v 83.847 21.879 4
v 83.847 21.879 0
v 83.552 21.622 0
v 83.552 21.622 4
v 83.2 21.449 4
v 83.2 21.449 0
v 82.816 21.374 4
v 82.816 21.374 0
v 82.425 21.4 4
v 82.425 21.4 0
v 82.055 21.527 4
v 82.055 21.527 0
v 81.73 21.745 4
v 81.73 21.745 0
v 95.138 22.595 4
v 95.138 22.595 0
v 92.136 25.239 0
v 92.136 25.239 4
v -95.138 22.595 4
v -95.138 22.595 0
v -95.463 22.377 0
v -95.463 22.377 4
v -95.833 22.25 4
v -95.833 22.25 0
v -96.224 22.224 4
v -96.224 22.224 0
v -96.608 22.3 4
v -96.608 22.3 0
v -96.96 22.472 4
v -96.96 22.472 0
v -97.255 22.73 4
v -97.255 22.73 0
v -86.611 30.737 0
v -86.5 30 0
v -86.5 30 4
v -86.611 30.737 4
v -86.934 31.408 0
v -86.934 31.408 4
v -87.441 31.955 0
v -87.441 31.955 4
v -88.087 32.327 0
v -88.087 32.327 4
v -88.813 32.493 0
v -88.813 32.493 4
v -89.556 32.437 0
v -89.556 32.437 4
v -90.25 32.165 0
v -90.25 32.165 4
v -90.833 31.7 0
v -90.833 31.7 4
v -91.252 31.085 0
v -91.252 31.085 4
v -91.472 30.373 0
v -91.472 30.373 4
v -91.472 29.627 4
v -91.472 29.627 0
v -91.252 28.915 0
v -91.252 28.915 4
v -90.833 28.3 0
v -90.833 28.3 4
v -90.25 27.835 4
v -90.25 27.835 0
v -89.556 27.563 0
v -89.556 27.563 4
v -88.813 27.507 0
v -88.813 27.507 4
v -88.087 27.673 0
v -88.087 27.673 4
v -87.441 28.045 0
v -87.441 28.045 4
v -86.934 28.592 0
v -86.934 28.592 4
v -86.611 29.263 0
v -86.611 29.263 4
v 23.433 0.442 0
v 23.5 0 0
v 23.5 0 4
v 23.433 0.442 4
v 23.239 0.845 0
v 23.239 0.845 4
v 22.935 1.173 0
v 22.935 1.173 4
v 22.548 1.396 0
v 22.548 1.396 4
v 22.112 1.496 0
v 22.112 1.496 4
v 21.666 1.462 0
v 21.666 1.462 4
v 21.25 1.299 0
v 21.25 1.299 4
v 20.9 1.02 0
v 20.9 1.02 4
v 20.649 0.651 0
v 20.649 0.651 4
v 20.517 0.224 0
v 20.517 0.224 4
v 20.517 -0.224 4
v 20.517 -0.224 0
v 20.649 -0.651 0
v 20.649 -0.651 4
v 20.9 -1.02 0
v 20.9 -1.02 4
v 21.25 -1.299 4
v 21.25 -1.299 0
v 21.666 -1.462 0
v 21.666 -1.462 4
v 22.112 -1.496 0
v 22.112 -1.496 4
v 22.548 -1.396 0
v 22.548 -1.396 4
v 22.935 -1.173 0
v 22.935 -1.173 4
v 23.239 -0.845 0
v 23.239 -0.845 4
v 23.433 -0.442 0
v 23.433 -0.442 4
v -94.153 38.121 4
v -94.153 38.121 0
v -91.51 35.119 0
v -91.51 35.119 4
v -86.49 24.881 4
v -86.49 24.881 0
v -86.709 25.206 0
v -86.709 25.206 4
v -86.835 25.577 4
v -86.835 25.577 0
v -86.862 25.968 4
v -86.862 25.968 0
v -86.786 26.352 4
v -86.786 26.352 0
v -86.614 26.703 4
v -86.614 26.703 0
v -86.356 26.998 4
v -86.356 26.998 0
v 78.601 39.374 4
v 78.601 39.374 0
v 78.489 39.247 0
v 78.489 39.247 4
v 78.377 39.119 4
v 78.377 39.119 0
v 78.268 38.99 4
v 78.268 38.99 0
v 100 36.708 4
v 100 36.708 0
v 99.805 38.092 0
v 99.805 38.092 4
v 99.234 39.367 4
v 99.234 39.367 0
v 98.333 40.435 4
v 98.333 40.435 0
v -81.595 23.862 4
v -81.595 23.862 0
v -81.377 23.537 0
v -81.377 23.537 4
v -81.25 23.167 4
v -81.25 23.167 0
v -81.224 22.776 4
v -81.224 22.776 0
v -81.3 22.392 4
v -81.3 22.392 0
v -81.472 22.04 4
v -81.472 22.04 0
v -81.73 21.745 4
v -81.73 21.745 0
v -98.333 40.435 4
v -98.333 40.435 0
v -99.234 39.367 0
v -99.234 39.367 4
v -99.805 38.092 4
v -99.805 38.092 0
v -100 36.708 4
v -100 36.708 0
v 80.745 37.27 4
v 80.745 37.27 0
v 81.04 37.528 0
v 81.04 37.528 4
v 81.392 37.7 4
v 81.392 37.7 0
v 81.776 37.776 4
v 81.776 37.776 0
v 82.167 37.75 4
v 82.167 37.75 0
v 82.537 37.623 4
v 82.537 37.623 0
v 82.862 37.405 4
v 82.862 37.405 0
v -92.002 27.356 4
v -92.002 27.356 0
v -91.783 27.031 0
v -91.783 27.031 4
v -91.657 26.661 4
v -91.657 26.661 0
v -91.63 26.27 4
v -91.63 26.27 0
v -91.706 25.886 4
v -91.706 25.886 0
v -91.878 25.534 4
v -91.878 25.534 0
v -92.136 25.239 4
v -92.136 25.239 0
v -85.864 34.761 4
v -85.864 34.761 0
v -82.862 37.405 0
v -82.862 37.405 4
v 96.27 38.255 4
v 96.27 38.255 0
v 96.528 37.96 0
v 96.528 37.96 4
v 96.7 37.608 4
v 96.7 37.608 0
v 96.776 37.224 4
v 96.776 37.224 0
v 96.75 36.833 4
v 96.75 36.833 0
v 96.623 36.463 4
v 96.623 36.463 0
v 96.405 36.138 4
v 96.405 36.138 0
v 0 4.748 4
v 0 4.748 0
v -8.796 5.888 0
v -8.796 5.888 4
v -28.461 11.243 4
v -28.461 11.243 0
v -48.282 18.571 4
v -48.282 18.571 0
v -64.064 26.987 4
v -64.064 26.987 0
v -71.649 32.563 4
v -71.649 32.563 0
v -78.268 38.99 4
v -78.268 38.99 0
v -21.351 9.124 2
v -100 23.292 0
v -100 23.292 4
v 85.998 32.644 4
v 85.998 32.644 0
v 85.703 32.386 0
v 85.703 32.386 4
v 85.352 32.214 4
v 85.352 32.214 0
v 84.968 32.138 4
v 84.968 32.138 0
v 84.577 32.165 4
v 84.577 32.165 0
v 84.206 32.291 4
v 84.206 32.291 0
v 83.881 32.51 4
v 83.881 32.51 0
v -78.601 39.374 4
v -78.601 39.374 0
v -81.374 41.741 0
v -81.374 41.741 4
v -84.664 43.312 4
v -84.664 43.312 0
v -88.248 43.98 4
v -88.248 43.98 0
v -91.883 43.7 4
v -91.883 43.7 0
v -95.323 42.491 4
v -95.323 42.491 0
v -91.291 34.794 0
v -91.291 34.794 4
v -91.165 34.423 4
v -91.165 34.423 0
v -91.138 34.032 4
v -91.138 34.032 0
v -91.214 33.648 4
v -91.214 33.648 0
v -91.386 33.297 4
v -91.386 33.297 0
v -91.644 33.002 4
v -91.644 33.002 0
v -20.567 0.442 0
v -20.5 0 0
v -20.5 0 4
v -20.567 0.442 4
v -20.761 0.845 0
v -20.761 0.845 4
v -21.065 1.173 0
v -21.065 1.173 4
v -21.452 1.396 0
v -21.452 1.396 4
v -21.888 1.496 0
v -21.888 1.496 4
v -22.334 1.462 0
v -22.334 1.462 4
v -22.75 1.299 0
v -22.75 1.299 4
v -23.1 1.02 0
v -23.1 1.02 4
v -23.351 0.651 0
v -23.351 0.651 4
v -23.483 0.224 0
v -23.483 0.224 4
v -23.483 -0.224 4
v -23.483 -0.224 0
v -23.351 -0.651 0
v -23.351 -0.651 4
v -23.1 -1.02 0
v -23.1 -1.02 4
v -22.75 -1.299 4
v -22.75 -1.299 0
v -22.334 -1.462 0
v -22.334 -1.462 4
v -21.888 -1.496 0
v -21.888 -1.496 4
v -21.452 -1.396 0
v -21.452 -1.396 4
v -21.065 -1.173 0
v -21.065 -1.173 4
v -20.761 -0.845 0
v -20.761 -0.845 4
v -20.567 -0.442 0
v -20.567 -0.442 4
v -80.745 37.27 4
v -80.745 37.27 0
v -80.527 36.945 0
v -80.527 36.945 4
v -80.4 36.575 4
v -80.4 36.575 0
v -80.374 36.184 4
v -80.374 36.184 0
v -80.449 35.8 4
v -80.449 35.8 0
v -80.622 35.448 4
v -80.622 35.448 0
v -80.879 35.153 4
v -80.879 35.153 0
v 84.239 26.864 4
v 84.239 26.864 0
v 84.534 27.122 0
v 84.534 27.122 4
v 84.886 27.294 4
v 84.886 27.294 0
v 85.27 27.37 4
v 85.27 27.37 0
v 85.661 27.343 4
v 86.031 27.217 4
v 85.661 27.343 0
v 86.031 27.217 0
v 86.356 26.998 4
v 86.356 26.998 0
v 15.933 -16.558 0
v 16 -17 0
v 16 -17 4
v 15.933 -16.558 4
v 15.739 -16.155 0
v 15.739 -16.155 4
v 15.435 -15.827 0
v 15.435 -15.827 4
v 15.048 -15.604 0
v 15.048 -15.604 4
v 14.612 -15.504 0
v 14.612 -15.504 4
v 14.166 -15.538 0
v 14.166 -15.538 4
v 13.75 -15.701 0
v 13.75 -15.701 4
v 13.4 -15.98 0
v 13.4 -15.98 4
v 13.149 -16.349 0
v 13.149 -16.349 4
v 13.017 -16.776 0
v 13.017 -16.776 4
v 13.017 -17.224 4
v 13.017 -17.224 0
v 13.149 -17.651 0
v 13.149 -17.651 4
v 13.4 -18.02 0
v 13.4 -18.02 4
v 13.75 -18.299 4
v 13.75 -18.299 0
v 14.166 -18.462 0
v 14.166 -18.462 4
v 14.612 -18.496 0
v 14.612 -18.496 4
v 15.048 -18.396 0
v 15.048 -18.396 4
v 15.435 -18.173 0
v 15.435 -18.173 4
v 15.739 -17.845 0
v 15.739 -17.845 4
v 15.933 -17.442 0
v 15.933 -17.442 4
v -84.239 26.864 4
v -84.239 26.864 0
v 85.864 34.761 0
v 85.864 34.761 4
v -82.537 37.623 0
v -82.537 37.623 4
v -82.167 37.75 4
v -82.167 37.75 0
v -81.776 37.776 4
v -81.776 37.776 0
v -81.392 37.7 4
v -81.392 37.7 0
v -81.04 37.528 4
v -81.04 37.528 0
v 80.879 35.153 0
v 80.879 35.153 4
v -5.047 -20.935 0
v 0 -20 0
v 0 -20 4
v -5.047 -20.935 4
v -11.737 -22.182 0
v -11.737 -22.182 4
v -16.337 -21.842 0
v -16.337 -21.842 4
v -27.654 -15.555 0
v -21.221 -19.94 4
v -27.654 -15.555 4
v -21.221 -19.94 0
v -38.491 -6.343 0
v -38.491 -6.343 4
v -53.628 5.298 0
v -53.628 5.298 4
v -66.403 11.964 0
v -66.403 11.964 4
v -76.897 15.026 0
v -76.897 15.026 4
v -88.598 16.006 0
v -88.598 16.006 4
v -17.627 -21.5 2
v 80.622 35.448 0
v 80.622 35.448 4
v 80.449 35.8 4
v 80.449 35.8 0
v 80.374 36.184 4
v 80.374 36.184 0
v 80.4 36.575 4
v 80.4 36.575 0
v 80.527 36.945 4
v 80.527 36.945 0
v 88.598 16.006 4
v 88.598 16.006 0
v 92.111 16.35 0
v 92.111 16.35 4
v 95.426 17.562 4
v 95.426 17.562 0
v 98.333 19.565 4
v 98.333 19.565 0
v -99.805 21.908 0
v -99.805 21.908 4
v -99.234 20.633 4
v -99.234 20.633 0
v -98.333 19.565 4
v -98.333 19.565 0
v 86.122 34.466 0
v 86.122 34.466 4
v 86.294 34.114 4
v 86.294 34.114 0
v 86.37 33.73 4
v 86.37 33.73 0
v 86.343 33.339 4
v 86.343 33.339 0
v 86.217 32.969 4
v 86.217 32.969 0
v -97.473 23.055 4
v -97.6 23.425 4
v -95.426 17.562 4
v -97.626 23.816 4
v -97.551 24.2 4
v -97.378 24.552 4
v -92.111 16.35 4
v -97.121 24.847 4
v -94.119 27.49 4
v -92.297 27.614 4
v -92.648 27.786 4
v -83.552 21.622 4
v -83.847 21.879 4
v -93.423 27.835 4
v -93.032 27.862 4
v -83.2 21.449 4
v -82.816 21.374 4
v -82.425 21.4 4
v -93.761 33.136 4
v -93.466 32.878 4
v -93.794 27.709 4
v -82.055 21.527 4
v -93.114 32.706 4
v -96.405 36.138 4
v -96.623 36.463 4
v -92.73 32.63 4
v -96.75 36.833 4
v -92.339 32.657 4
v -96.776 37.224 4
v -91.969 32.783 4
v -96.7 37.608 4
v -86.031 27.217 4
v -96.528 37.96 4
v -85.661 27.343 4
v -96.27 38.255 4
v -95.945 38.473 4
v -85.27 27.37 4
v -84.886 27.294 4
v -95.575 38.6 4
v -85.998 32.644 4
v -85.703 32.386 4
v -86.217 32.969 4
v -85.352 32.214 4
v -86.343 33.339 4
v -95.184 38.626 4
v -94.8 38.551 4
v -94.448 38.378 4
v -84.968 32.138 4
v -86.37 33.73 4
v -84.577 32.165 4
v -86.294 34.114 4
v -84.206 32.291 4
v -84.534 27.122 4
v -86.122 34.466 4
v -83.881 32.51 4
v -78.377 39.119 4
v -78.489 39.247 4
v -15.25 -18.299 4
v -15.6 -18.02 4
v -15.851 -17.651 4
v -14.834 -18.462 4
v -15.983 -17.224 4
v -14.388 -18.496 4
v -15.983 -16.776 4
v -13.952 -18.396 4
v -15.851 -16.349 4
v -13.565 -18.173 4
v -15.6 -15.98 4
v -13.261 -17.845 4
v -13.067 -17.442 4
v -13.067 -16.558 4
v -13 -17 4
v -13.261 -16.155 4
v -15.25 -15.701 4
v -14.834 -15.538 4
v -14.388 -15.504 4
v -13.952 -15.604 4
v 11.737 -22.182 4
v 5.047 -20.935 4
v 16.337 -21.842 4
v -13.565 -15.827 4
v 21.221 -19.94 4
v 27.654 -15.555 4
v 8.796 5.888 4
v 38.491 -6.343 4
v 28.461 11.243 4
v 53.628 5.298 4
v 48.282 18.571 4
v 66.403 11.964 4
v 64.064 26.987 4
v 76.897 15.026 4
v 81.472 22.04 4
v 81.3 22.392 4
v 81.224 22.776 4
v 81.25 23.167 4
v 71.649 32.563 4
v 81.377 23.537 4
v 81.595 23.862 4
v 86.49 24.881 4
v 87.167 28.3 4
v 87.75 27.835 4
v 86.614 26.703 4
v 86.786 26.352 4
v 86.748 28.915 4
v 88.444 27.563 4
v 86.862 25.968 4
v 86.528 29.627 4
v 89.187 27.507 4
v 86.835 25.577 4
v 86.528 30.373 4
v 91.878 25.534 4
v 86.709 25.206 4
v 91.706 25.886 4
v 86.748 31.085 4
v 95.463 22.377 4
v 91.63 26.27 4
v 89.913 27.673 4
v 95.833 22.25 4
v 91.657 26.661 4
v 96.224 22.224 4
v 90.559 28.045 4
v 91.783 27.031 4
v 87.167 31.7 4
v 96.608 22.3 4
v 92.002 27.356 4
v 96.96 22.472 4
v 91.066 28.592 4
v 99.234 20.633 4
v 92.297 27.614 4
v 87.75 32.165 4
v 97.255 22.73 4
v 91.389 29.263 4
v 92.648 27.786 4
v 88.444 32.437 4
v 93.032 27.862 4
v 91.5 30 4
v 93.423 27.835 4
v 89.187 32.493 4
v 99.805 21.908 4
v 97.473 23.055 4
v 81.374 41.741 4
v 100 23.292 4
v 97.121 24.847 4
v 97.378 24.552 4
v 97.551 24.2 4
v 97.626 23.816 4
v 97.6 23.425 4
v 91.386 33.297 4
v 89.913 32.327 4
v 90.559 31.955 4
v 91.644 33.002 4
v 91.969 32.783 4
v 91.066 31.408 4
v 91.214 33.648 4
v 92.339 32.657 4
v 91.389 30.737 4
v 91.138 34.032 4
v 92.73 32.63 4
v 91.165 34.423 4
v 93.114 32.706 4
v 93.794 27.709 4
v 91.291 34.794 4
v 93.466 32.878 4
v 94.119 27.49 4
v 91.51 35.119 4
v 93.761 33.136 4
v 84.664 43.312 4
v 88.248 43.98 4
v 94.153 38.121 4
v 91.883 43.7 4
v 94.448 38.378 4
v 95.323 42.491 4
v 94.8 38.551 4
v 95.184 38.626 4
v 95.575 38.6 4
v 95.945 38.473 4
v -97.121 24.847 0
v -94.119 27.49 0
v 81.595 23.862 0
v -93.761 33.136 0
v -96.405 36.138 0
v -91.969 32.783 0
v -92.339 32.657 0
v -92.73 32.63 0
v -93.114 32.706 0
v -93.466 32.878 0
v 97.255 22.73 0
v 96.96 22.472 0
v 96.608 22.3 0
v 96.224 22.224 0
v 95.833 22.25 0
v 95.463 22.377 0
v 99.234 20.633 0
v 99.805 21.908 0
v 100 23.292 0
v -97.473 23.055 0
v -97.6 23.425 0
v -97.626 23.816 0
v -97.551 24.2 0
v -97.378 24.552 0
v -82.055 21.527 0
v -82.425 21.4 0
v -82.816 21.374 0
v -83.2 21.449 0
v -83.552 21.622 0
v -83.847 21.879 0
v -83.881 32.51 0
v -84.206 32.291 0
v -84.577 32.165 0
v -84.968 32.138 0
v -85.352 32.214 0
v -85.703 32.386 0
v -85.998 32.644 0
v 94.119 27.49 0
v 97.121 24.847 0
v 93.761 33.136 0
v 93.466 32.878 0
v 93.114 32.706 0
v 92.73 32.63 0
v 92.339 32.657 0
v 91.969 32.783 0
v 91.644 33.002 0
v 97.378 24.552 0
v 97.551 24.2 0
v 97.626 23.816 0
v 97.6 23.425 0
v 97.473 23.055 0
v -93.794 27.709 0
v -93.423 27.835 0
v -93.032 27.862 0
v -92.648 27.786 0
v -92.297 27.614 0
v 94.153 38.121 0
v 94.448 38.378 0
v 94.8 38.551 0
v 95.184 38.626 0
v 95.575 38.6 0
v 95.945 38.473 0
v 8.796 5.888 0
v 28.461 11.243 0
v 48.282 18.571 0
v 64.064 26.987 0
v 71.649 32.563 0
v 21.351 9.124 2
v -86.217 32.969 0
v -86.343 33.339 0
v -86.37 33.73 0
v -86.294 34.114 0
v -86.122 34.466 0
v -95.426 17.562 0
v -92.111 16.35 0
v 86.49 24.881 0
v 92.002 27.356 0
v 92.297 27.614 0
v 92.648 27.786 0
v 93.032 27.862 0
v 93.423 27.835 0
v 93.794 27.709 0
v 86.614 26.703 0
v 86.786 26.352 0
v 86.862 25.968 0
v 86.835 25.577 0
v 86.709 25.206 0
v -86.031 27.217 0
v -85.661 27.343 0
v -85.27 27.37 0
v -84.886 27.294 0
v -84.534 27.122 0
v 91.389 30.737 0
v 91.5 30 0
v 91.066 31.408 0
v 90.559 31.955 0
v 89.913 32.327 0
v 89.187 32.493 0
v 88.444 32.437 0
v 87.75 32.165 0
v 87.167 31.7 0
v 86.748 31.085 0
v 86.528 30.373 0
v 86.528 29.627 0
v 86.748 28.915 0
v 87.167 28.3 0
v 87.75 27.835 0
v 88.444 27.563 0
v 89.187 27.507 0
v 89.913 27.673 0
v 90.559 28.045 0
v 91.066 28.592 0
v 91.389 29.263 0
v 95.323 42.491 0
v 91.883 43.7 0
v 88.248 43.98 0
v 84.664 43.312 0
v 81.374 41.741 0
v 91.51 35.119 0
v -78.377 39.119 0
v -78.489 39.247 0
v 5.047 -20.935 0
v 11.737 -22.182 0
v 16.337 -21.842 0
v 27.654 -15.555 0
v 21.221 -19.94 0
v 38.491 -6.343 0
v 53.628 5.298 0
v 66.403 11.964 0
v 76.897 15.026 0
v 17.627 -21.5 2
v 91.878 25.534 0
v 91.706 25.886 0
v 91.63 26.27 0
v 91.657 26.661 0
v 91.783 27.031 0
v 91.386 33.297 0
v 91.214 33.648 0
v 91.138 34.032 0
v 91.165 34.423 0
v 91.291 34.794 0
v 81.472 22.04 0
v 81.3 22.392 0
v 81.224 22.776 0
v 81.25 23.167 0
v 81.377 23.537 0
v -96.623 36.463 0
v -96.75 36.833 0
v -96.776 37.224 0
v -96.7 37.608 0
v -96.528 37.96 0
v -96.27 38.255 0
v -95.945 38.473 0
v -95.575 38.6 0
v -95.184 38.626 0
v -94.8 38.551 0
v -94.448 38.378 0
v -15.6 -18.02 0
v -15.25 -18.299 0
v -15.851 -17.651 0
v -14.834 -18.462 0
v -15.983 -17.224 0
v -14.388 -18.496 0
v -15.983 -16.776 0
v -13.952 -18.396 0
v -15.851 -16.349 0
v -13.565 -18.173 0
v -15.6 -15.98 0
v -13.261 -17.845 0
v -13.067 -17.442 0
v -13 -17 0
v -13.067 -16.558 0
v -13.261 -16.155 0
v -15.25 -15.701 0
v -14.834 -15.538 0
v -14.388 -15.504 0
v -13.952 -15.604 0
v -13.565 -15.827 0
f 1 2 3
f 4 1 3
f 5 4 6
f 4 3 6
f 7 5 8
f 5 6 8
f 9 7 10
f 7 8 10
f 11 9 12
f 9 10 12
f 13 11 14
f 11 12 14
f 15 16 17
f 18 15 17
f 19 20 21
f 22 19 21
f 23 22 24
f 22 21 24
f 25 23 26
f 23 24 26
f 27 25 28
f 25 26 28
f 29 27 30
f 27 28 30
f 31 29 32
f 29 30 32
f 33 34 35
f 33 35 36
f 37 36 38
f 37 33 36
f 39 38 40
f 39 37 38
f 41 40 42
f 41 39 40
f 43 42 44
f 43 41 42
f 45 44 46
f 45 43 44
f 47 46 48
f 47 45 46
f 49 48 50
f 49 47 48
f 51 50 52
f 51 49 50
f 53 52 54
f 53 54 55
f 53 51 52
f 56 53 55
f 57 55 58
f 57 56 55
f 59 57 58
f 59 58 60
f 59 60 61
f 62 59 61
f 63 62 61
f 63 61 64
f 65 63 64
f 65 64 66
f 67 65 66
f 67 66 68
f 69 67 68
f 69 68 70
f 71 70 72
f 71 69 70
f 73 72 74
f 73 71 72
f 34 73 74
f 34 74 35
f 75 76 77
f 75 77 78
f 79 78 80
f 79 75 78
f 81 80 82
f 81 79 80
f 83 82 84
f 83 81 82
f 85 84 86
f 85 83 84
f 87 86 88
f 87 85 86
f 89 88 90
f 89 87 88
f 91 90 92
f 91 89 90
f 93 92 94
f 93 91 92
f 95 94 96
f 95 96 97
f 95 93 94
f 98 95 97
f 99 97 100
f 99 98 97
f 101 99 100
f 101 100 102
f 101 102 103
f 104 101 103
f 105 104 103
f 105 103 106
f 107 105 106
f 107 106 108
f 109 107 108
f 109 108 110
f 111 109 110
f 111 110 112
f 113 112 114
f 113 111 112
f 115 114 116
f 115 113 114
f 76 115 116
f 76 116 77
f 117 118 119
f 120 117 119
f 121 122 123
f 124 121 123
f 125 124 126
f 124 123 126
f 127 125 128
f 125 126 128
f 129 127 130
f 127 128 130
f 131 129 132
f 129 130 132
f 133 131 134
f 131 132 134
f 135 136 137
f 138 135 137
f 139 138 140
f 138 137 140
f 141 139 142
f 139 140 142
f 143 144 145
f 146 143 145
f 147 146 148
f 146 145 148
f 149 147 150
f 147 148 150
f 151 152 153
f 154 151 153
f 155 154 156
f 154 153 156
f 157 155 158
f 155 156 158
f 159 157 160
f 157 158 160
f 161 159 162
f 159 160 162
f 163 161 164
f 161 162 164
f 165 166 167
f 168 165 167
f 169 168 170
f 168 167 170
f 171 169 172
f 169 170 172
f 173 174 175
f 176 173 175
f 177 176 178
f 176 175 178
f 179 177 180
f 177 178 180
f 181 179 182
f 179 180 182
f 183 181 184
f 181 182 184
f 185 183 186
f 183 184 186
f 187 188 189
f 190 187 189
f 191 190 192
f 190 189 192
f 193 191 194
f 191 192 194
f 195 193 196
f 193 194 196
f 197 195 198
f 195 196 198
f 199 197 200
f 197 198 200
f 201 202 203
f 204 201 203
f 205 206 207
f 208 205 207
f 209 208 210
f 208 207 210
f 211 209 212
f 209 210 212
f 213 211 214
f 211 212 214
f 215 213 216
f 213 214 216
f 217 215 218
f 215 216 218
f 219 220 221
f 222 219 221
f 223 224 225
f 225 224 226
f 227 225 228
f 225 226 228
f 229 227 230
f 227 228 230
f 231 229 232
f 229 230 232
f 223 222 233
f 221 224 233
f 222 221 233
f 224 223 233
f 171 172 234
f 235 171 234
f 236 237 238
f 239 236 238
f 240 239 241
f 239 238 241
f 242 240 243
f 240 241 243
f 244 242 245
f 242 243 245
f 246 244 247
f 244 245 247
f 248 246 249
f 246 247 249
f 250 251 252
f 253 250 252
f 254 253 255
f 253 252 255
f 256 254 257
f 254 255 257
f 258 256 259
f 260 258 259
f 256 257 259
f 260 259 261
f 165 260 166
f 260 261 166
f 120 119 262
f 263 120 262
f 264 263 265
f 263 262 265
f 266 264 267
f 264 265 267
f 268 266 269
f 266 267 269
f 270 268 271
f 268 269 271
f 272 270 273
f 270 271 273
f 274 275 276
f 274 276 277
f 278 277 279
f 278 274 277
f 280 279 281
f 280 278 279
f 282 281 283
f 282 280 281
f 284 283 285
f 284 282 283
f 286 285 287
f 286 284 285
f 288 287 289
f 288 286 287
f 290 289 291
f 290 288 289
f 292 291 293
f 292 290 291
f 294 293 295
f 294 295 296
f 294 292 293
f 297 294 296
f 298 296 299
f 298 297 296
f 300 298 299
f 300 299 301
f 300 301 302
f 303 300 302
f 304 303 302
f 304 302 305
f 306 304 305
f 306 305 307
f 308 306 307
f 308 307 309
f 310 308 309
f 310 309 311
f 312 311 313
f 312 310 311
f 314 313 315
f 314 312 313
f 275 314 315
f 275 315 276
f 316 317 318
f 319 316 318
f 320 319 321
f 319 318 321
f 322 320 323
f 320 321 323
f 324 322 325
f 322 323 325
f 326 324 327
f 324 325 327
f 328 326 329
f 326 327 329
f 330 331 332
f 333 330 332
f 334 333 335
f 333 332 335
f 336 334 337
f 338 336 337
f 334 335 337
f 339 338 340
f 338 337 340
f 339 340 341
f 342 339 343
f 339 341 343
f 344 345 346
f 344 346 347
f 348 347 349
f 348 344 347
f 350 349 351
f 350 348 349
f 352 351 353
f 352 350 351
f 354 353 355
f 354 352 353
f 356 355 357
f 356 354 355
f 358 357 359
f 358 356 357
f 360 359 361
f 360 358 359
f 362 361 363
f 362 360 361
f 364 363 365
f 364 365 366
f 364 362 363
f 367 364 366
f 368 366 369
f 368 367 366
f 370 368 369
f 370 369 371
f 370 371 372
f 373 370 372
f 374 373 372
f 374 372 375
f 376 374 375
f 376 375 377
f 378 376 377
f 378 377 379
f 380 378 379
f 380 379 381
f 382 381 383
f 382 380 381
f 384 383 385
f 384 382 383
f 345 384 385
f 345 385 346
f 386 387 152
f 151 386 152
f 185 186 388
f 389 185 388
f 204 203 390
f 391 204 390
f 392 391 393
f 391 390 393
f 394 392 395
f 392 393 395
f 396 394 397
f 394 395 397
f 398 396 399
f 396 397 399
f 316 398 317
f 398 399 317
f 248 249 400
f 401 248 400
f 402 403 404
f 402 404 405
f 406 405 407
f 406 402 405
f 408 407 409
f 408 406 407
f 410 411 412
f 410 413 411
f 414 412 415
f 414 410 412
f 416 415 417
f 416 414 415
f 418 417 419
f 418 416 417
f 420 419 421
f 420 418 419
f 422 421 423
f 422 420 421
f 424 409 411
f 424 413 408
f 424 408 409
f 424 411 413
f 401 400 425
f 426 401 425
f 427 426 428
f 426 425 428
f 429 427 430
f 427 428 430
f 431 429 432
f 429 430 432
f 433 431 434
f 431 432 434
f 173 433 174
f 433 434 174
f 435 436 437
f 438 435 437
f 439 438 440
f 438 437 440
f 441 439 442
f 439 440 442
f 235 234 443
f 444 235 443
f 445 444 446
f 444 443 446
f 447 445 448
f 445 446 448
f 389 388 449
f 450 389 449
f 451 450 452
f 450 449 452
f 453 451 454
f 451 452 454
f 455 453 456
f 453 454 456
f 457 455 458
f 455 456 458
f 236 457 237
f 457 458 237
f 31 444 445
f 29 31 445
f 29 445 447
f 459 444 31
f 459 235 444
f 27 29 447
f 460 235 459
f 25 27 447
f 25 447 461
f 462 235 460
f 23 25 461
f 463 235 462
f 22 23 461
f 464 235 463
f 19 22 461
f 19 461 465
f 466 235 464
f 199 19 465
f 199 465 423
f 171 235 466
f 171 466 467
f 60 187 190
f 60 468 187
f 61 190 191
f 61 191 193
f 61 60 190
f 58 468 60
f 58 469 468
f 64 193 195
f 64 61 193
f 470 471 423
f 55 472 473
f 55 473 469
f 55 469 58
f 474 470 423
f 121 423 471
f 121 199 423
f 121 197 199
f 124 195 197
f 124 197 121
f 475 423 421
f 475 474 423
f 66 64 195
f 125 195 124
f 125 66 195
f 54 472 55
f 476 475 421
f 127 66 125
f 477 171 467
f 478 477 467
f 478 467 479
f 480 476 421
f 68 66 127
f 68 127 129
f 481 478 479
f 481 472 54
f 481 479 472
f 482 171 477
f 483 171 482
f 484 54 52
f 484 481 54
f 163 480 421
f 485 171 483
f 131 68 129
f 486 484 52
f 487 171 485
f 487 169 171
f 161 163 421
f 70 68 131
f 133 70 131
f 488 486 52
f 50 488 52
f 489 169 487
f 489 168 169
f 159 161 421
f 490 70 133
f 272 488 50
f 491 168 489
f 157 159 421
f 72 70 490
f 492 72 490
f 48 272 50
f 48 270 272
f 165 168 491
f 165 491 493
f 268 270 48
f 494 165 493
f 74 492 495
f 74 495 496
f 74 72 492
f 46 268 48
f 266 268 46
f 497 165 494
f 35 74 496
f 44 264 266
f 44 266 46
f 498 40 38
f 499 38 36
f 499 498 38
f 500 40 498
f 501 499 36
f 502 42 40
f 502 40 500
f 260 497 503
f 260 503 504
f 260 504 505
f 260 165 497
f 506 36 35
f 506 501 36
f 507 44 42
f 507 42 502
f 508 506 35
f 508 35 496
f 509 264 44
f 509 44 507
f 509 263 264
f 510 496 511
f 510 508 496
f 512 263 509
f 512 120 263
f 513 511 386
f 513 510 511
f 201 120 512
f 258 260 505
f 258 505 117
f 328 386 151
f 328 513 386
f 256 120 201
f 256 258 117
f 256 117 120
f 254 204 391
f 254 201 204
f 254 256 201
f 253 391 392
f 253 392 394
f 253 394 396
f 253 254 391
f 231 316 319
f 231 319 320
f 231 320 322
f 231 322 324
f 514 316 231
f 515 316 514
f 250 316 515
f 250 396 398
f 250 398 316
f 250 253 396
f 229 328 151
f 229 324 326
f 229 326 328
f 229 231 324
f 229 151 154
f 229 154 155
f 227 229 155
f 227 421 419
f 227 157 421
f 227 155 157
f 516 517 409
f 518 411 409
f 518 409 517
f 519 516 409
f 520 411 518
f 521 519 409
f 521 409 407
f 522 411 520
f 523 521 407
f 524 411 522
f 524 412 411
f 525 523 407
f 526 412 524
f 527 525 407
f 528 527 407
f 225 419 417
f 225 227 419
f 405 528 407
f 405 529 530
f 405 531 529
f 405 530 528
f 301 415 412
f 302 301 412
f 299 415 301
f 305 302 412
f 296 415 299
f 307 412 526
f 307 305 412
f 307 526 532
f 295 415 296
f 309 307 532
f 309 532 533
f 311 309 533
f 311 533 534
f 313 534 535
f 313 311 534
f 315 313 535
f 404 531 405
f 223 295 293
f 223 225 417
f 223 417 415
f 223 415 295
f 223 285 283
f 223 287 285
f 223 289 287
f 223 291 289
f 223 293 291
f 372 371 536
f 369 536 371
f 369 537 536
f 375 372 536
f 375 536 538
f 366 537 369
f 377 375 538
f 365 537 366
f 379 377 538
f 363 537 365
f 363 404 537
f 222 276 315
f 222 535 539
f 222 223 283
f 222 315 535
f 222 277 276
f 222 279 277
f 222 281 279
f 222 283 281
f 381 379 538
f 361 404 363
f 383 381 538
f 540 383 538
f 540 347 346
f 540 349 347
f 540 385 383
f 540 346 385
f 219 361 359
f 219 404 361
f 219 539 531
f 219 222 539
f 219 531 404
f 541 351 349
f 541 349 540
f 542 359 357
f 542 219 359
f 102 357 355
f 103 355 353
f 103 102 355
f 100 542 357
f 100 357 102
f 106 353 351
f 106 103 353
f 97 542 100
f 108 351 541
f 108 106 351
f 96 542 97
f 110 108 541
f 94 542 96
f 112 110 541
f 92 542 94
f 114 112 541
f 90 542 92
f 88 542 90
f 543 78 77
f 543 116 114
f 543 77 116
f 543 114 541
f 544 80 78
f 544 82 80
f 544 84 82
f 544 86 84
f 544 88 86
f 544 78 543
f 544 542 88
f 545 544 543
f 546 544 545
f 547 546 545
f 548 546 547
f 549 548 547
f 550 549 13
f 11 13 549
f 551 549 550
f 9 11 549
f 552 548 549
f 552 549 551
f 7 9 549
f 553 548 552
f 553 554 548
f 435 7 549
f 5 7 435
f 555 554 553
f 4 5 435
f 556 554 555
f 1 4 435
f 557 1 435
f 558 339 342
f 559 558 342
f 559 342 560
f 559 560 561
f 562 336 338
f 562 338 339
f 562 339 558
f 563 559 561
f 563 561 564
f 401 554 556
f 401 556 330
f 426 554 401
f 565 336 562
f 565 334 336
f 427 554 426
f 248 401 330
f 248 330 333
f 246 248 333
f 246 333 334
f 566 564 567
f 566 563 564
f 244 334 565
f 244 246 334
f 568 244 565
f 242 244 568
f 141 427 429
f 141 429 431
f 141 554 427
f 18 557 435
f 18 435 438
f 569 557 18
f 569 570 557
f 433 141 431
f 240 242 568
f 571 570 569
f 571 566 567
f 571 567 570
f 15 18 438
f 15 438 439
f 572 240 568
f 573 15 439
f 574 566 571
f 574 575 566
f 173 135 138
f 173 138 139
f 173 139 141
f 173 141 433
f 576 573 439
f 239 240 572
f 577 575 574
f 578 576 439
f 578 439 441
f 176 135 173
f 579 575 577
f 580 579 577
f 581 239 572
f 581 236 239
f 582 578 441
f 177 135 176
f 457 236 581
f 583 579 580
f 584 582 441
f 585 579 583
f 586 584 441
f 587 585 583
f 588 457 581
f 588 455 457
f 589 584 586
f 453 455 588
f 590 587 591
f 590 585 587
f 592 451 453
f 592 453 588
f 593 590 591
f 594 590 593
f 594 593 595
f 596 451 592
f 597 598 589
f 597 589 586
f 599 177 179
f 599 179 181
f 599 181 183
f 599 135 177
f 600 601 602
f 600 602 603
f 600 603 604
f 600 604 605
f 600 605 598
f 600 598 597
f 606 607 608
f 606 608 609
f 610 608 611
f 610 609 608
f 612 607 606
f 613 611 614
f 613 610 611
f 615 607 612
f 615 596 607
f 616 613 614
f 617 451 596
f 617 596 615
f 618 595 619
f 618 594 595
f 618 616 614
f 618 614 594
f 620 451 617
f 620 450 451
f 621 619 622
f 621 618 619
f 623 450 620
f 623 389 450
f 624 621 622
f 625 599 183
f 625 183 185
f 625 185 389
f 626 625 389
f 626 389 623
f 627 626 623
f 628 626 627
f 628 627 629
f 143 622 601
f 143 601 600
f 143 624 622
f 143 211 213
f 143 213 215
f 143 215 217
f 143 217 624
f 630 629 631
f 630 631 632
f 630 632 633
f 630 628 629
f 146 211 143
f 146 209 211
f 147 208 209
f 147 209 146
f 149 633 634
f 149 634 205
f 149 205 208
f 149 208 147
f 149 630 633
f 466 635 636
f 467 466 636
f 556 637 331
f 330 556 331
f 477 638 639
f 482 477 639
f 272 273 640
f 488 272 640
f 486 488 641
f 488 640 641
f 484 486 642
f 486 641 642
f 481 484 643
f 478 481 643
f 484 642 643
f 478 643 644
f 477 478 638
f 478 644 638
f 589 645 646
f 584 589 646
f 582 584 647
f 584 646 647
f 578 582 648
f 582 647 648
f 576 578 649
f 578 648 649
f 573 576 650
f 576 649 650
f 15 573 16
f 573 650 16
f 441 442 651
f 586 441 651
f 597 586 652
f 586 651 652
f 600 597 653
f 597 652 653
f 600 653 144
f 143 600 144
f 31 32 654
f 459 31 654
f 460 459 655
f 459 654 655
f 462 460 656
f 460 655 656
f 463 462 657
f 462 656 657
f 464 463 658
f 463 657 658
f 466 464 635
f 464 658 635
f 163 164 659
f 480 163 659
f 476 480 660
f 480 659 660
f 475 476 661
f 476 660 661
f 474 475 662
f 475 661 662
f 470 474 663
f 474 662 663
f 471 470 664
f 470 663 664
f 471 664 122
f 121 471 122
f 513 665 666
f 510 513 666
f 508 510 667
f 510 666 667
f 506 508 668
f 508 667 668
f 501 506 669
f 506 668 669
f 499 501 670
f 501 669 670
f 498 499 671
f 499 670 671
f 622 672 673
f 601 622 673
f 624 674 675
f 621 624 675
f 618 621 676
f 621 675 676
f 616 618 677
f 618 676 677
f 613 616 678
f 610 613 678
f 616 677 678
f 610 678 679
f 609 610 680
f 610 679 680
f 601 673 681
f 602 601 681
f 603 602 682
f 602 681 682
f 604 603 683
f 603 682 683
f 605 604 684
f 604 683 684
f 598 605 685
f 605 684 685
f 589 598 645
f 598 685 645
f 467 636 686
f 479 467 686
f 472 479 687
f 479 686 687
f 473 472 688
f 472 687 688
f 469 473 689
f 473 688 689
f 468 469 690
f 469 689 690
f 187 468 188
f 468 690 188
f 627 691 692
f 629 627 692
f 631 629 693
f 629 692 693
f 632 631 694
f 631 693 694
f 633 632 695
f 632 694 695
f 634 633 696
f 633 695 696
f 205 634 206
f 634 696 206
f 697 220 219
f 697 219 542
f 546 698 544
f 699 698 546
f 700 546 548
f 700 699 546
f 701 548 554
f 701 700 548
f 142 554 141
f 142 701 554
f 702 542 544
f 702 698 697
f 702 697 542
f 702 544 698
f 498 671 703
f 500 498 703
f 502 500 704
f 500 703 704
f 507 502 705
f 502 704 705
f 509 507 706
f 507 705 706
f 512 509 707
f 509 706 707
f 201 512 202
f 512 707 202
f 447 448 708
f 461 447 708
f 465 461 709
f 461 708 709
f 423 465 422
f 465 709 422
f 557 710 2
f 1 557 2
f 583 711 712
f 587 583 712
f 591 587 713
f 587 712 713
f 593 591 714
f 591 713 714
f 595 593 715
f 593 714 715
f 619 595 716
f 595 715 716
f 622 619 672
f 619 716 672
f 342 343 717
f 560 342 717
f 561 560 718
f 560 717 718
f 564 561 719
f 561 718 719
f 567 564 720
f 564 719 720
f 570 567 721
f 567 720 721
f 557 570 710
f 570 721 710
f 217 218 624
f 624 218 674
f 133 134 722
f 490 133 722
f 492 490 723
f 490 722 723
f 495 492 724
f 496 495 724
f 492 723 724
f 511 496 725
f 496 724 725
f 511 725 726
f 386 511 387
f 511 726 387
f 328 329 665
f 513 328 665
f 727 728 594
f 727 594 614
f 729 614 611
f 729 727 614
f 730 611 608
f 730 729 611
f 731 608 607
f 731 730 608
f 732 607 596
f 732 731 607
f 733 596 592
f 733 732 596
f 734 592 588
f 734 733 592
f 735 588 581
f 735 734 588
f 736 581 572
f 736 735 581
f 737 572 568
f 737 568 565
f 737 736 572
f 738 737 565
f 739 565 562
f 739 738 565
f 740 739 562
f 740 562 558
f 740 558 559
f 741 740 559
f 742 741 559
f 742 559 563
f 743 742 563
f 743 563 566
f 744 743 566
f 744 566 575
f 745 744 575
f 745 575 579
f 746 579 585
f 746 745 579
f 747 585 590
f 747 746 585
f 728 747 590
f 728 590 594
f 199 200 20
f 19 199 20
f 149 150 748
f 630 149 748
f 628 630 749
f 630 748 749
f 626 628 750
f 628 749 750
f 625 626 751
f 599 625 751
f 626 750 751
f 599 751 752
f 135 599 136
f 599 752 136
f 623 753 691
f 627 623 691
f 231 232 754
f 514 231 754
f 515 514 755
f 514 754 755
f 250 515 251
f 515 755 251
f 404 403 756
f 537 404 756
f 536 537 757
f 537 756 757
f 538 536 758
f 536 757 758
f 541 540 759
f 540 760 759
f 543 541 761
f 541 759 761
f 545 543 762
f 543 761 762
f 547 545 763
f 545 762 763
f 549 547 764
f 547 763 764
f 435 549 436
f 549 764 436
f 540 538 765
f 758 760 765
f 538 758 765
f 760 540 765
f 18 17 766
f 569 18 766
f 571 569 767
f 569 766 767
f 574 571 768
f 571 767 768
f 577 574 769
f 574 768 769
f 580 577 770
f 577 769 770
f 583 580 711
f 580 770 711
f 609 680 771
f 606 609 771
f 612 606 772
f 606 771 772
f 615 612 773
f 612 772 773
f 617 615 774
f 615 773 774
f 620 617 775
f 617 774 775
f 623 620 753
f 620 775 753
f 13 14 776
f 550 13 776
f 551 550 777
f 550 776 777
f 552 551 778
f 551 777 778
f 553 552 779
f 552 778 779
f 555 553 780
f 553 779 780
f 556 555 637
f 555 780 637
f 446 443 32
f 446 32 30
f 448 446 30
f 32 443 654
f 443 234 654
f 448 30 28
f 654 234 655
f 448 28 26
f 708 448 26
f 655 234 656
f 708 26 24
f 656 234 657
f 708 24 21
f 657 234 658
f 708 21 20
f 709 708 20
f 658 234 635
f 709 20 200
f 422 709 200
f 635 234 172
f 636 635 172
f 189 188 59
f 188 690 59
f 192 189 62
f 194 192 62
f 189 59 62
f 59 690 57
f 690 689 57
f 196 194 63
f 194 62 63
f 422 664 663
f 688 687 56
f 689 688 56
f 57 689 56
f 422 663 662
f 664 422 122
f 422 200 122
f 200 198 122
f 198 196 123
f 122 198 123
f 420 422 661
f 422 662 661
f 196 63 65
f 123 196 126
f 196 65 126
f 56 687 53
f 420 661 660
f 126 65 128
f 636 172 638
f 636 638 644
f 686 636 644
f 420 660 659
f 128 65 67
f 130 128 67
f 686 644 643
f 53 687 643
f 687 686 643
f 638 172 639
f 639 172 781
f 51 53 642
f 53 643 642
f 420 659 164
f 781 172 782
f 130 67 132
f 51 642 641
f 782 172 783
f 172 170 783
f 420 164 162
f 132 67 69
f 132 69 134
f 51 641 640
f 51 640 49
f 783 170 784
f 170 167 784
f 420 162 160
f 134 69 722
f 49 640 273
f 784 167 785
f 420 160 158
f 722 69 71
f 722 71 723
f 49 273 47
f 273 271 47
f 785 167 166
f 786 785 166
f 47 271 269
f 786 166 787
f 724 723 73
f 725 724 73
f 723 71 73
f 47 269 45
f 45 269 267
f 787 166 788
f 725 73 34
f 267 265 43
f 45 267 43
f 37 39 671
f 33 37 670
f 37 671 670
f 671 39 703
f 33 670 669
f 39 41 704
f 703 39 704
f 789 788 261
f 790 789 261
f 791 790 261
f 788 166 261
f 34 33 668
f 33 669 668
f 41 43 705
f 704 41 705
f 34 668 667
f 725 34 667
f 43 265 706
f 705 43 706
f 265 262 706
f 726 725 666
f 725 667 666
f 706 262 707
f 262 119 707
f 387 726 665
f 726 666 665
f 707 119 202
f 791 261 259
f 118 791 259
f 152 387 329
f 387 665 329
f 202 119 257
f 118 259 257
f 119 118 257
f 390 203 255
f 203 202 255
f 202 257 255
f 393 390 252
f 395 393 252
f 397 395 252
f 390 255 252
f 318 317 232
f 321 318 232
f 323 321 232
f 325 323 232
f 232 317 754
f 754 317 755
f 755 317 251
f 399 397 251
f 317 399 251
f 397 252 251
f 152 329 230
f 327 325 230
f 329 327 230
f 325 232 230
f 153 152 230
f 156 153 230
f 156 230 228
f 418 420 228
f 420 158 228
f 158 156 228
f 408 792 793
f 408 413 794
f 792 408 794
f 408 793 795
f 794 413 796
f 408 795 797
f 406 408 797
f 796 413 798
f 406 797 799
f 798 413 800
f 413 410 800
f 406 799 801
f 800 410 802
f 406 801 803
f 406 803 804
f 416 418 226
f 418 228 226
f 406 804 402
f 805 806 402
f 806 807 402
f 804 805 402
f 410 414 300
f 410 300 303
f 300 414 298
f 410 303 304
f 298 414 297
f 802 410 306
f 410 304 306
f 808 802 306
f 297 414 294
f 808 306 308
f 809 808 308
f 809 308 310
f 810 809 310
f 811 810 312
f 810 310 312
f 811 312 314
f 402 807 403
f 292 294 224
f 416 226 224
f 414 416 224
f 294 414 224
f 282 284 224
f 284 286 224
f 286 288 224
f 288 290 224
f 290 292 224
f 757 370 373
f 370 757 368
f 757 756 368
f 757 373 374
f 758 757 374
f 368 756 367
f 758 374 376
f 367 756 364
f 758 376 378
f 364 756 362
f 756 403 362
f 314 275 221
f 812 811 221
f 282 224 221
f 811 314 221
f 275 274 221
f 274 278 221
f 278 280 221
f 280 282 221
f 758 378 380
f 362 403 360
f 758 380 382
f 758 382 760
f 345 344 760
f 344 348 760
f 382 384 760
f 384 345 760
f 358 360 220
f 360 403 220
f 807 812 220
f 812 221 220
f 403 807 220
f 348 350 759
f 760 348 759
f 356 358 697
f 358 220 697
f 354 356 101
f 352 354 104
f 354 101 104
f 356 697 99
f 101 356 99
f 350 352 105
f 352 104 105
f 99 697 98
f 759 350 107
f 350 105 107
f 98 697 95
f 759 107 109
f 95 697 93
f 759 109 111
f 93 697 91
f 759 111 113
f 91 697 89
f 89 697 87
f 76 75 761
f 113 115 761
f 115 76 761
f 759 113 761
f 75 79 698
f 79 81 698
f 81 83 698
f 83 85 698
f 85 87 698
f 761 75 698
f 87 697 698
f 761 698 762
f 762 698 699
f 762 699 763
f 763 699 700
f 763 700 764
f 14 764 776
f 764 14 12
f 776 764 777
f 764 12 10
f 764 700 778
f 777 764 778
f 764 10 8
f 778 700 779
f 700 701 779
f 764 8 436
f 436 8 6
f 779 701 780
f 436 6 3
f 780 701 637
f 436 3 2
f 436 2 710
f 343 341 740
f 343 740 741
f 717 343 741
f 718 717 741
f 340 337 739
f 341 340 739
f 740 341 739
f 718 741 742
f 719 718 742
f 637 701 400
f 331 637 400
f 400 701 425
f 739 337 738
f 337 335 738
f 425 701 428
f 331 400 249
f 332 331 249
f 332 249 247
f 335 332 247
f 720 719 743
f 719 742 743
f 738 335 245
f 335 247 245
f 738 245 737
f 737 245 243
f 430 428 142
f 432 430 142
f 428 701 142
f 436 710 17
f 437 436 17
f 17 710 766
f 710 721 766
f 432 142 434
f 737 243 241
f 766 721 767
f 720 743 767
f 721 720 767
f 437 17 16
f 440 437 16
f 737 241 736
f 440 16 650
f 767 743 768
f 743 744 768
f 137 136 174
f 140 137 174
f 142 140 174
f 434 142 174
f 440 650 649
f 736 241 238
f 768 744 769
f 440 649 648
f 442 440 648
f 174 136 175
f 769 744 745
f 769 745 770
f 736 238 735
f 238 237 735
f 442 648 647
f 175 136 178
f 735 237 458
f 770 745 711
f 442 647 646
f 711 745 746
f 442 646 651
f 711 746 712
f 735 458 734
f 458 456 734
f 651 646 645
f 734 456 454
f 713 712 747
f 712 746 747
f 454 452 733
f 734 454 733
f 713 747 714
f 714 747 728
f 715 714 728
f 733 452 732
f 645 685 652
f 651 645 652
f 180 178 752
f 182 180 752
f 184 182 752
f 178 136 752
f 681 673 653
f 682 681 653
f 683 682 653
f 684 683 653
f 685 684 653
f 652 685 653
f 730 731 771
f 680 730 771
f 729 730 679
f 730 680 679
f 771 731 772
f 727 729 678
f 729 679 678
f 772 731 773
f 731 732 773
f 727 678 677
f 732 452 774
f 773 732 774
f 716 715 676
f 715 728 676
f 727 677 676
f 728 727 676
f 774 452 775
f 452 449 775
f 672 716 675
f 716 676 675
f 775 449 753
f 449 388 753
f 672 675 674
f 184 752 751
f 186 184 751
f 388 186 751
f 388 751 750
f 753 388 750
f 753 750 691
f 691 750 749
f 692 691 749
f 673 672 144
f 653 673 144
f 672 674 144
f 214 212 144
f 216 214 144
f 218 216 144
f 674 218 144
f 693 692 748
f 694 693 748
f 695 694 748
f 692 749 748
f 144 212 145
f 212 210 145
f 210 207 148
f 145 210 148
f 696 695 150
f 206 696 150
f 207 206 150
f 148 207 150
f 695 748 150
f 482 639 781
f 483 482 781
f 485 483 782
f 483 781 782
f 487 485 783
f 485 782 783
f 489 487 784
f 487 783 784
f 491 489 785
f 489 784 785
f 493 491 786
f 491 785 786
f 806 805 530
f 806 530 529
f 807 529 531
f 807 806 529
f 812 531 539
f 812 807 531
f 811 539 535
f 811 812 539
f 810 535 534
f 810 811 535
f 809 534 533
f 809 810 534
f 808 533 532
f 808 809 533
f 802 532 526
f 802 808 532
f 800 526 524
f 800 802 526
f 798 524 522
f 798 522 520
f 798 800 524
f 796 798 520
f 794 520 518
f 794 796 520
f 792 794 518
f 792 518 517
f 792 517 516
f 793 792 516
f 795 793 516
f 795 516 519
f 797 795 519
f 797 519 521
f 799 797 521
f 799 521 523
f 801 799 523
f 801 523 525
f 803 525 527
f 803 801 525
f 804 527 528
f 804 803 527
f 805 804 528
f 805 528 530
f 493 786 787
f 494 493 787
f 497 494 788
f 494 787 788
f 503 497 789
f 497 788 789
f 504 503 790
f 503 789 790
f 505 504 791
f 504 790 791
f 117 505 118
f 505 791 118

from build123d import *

# Parameters (mm, degrees)
F0_R     = 2.5
F0_R_2   = 1.5
F1_DEPTH = 4


with BuildPart() as f1:
    # F0 (on Top) → F1 (new body)
    with BuildSketch(Plane.XY):
        with BuildLine():
            ThreePointArc((100, 36.7082039325), (99.5643546459, 38.7494453848), (98.3333333333, 40.434983895))
            ThreePointArc((98.3333333333, 40.434983895), (88.2480547914, 43.9797917868), (78.6012006129, 39.3736317032))
            add(Edge.make_bspline(
                [(78.2678444341, 38.9900409849), (78.3796218574, 39.1174296296), (78.4907435172, 39.2452925352), (78.6012006129, 39.3736317032)],
                knots=[0.9951145834, 0.9951145834, 0.9951145834, 0.9951145834, 1, 1, 1, 1], degree=3))
            ThreePointArc((78.2678444341, 38.9900409849), (76.230411331, 24.2608706912), (88.5978294237, 16.0057776626))
            ThreePointArc((88.5978294237, 16.0057776626), (93.807126129, 16.8511773006), (98.3333333333, 19.565016105))
            ThreePointArc((98.3333333333, 19.565016105), (99.5643546459, 21.2505546152), (100, 23.2917960675))
            Line((100, 23.2917960675), (100, 36.7082039325))
        make_face()
        with BuildLine():
            Line((86.490440342, 24.8812003045), (83.846652322, 21.8794699859))
            ThreePointArc((83.846652322, 21.8794699859), (82.8159172375, 21.3738963808), (81.729582945, 21.745241624))
            ThreePointArc((81.729582945, 21.745241624), (81.2240093398, 22.7759767085), (81.595354583, 23.8623110009))
            Line((81.595354583, 23.8623110009), (84.239142603, 26.8640413195))
            ThreePointArc((84.239142603, 26.8640413195), (85.2698776875, 27.3696149247), (86.35621198, 26.9982696815))
            ThreePointArc((86.35621198, 26.9982696815), (86.8617855852, 25.967534597), (86.490440342, 24.8812003045))
        make_face(mode=Mode.SUBTRACT)
        with BuildLine():
            Line((94.1187996955, 27.490440342), (97.1205300141, 24.846652322))
            ThreePointArc((97.1205300141, 24.846652322), (97.6261036192, 23.8159172375), (97.254758376, 22.729582945))
            ThreePointArc((97.254758376, 22.729582945), (96.2240232915, 22.2240093398), (95.1376889991, 22.595354583))
            Line((95.1376889991, 22.595354583), (92.1359586805, 25.239142603))
            ThreePointArc((92.1359586805, 25.239142603), (91.6303850753, 26.2698776875), (92.0017303185, 27.35621198))
            ThreePointArc((92.0017303185, 27.35621198), (93.032465403, 27.8617855852), (94.1187996955, 27.490440342))
        make_face(mode=Mode.SUBTRACT)
        with Locations((89, 30)):
            Circle(F0_R, mode=Mode.SUBTRACT)
        with BuildLine():
            Line((83.8812003045, 32.509559658), (80.8794699859, 35.153347678))
            ThreePointArc((80.8794699859, 35.153347678), (80.3738963808, 36.1840827625), (80.745241624, 37.270417055))
            ThreePointArc((80.745241624, 37.270417055), (81.7759767085, 37.7759906602), (82.8623110009, 37.404645417))
            Line((82.8623110009, 37.404645417), (85.8640413195, 34.760857397))
            ThreePointArc((85.8640413195, 34.760857397), (86.3696149247, 33.7301223125), (85.9982696815, 32.64378802))
            ThreePointArc((85.9982696815, 32.64378802), (84.967534597, 32.1382144148), (83.8812003045, 32.509559658))
        make_face(mode=Mode.SUBTRACT)
        with BuildLine():
            Line((91.509559658, 35.1187996955), (94.153347678, 38.1205300141))
            ThreePointArc((94.153347678, 38.1205300141), (95.1840827625, 38.6261036192), (96.270417055, 38.254758376))
            ThreePointArc((96.270417055, 38.254758376), (96.7759906602, 37.2240232915), (96.404645417, 36.1376889991))
            Line((96.404645417, 36.1376889991), (93.760857397, 33.1359586805))
            ThreePointArc((93.760857397, 33.1359586805), (92.7301223125, 32.6303850753), (91.64378802, 33.0017303185))
            ThreePointArc((91.64378802, 33.0017303185), (91.1382144148, 34.032465403), (91.509559658, 35.1187996955))
        make_face(mode=Mode.SUBTRACT)
        with BuildLine():
            add(Edge.make_bspline(
                [(78.2678444341, 38.9900409849), (78.3796218574, 39.1174296296), (78.4907435172, 39.2452925352), (78.6012006129, 39.3736317032)],
                knots=[0.9951145834, 0.9951145834, 0.9951145834, 0.9951145834, 1, 1, 1, 1], degree=3))
            ThreePointArc((78.6012006129, 39.3736317032), (78.4327818341, 39.1833490751), (78.2678444341, 38.9900409849))
        make_face()
        with BuildLine():
            ThreePointArc((88.5978294237, 16.0057776626), (76.230411331, 24.2608706912), (78.2678444341, 38.9900409849))
            add(Edge.make_bspline(
                [(0, 4.748087842), (3.7510812941, 4.556623698), (23.9631634822, 9.0849893596), (63.9002947469, 22.6158696289), (78.2678444341, 38.9900409849)],
                knots=[0, 0, 0, 0, 0.3671571365, 0.9951145834, 0.9951145834, 0.9951145834, 0.9951145834], degree=3))
            add(Edge.make_bspline(
                [(0, 4.748087842), (-3.7510812941, 4.556623698), (-23.9631634822, 9.0849893596), (-63.9002947469, 22.6158696289), (-78.2678444341, 38.9900409849)],
                knots=[0, 0, 0, 0, 0.3671571365, 0.9951145834, 0.9951145834, 0.9951145834, 0.9951145834], degree=3))
            ThreePointArc((-78.2678444341, 38.9900409849), (-76.230411331, 24.2608706912), (-88.5978294237, 16.0057776626))
            add(Edge.make_bspline(
                [(0, -20), (-3.7175141039, -19.8114133897), (-24.2979575574, -32.2702358468), (-52.3226244724, 16.7220671125), (-88.5978294237, 16.0057776626)],
                knots=[0, 0, 0, 0, 0.3194759338, 1, 1, 1, 1], degree=3))
            add(Edge.make_bspline(
                [(0, -20), (3.7175141039, -19.8114133897), (24.2979575574, -32.2702358468), (52.3226244724, 16.7220671125), (88.5978294237, 16.0057776626)],
                knots=[0, 0, 0, 0, 0.3194759338, 1, 1, 1, 1], degree=3))
        make_face()
        with Locations((-14.5, -17)):
            Circle(F0_R_2, mode=Mode.SUBTRACT)
        with Locations((-22, 0)):
            Circle(F0_R_2, mode=Mode.SUBTRACT)
        with Locations((14.5, -17)):
            Circle(F0_R_2, mode=Mode.SUBTRACT)
        with Locations((22, 0)):
            Circle(F0_R_2, mode=Mode.SUBTRACT)
        with BuildLine():
            add(Edge.make_bspline(
                [(-78.2678444341, 38.9900409849), (-78.3796218574, 39.1174296296), (-78.4907435172, 39.2452925352), (-78.6012006129, 39.3736317032)],
                knots=[0.9951145834, 0.9951145834, 0.9951145834, 0.9951145834, 1, 1, 1, 1], degree=3))
            ThreePointArc((-78.2678444341, 38.9900409849), (-78.4327818341, 39.1833490751), (-78.6012006129, 39.3736317032))
        make_face()
        with BuildLine():
            ThreePointArc((-88.5978294237, 16.0057776626), (-76.230411331, 24.2608706912), (-78.2678444341, 38.9900409849))
            add(Edge.make_bspline(
                [(-78.2678444341, 38.9900409849), (-78.3796218574, 39.1174296296), (-78.4907435172, 39.2452925352), (-78.6012006129, 39.3736317032)],
                knots=[0.9951145834, 0.9951145834, 0.9951145834, 0.9951145834, 1, 1, 1, 1], degree=3))
            ThreePointArc((-78.6012006129, 39.3736317032), (-88.2480547914, 43.9797917868), (-98.3333333333, 40.434983895))
            ThreePointArc((-98.3333333333, 40.434983895), (-99.5643546459, 38.7494453848), (-100, 36.7082039325))
            Line((-100, 36.7082039325), (-100, 23.2917960675))
            ThreePointArc((-100, 23.2917960675), (-99.5643546459, 21.2505546152), (-98.3333333333, 19.565016105))
            ThreePointArc((-98.3333333333, 19.565016105), (-93.807126129, 16.8511773006), (-88.5978294237, 16.0057776626))
        make_face()
        with BuildLine():
            ThreePointArc((-81.729582945, 21.745241624), (-82.8159172375, 21.3738963808), (-83.846652322, 21.8794699859))
            Line((-83.846652322, 21.8794699859), (-86.490440342, 24.8812003045))
            ThreePointArc((-86.490440342, 24.8812003045), (-86.8617855852, 25.967534597), (-86.35621198, 26.9982696815))
            ThreePointArc((-86.35621198, 26.9982696815), (-85.2698776875, 27.3696149247), (-84.239142603, 26.8640413195))
            Line((-84.239142603, 26.8640413195), (-81.595354583, 23.8623110009))
            ThreePointArc((-81.595354583, 23.8623110009), (-81.2240093398, 22.7759767085), (-81.729582945, 21.745241624))
        make_face(mode=Mode.SUBTRACT)
        with BuildLine():
            Line((-92.1359586805, 25.239142603), (-95.1376889991, 22.595354583))
            ThreePointArc((-95.1376889991, 22.595354583), (-96.2240232915, 22.2240093398), (-97.254758376, 22.729582945))
            ThreePointArc((-97.254758376, 22.729582945), (-97.6261036192, 23.8159172375), (-97.1205300141, 24.846652322))
            Line((-97.1205300141, 24.846652322), (-94.1187996955, 27.490440342))
            ThreePointArc((-94.1187996955, 27.490440342), (-93.032465403, 27.8617855852), (-92.0017303185, 27.35621198))
            ThreePointArc((-92.0017303185, 27.35621198), (-91.6303850753, 26.2698776875), (-92.1359586805, 25.239142603))
        make_face(mode=Mode.SUBTRACT)
        with Locations((-89, 30)):
            Circle(F0_R, mode=Mode.SUBTRACT)
        with BuildLine():
            Line((-93.760857397, 33.1359586805), (-96.404645417, 36.1376889991))
            ThreePointArc((-96.404645417, 36.1376889991), (-96.7759906602, 37.2240232915), (-96.270417055, 38.254758376))
            ThreePointArc((-96.270417055, 38.254758376), (-95.1840827625, 38.6261036192), (-94.153347678, 38.1205300141))
            Line((-94.153347678, 38.1205300141), (-91.509559658, 35.1187996955))
            ThreePointArc((-91.509559658, 35.1187996955), (-91.1382144148, 34.032465403), (-91.64378802, 33.0017303185))
            ThreePointArc((-91.64378802, 33.0017303185), (-92.7301223125, 32.6303850753), (-93.760857397, 33.1359586805))
        make_face(mode=Mode.SUBTRACT)
        with BuildLine():
            ThreePointArc((-80.745241624, 37.270417055), (-80.3738963808, 36.1840827625), (-80.8794699859, 35.153347678))
            Line((-80.8794699859, 35.153347678), (-83.8812003045, 32.509559658))
            ThreePointArc((-83.8812003045, 32.509559658), (-84.967534597, 32.1382144148), (-85.9982696815, 32.64378802))
            ThreePointArc((-85.9982696815, 32.64378802), (-86.3696149247, 33.7301223125), (-85.8640413195, 34.760857397))
            Line((-85.8640413195, 34.760857397), (-82.8623110009, 37.404645417))
            ThreePointArc((-82.8623110009, 37.404645417), (-81.7759767085, 37.7759906602), (-80.745241624, 37.270417055))
        make_face(mode=Mode.SUBTRACT)
    extrude(amount=F1_DEPTH)


solid = f1.part
